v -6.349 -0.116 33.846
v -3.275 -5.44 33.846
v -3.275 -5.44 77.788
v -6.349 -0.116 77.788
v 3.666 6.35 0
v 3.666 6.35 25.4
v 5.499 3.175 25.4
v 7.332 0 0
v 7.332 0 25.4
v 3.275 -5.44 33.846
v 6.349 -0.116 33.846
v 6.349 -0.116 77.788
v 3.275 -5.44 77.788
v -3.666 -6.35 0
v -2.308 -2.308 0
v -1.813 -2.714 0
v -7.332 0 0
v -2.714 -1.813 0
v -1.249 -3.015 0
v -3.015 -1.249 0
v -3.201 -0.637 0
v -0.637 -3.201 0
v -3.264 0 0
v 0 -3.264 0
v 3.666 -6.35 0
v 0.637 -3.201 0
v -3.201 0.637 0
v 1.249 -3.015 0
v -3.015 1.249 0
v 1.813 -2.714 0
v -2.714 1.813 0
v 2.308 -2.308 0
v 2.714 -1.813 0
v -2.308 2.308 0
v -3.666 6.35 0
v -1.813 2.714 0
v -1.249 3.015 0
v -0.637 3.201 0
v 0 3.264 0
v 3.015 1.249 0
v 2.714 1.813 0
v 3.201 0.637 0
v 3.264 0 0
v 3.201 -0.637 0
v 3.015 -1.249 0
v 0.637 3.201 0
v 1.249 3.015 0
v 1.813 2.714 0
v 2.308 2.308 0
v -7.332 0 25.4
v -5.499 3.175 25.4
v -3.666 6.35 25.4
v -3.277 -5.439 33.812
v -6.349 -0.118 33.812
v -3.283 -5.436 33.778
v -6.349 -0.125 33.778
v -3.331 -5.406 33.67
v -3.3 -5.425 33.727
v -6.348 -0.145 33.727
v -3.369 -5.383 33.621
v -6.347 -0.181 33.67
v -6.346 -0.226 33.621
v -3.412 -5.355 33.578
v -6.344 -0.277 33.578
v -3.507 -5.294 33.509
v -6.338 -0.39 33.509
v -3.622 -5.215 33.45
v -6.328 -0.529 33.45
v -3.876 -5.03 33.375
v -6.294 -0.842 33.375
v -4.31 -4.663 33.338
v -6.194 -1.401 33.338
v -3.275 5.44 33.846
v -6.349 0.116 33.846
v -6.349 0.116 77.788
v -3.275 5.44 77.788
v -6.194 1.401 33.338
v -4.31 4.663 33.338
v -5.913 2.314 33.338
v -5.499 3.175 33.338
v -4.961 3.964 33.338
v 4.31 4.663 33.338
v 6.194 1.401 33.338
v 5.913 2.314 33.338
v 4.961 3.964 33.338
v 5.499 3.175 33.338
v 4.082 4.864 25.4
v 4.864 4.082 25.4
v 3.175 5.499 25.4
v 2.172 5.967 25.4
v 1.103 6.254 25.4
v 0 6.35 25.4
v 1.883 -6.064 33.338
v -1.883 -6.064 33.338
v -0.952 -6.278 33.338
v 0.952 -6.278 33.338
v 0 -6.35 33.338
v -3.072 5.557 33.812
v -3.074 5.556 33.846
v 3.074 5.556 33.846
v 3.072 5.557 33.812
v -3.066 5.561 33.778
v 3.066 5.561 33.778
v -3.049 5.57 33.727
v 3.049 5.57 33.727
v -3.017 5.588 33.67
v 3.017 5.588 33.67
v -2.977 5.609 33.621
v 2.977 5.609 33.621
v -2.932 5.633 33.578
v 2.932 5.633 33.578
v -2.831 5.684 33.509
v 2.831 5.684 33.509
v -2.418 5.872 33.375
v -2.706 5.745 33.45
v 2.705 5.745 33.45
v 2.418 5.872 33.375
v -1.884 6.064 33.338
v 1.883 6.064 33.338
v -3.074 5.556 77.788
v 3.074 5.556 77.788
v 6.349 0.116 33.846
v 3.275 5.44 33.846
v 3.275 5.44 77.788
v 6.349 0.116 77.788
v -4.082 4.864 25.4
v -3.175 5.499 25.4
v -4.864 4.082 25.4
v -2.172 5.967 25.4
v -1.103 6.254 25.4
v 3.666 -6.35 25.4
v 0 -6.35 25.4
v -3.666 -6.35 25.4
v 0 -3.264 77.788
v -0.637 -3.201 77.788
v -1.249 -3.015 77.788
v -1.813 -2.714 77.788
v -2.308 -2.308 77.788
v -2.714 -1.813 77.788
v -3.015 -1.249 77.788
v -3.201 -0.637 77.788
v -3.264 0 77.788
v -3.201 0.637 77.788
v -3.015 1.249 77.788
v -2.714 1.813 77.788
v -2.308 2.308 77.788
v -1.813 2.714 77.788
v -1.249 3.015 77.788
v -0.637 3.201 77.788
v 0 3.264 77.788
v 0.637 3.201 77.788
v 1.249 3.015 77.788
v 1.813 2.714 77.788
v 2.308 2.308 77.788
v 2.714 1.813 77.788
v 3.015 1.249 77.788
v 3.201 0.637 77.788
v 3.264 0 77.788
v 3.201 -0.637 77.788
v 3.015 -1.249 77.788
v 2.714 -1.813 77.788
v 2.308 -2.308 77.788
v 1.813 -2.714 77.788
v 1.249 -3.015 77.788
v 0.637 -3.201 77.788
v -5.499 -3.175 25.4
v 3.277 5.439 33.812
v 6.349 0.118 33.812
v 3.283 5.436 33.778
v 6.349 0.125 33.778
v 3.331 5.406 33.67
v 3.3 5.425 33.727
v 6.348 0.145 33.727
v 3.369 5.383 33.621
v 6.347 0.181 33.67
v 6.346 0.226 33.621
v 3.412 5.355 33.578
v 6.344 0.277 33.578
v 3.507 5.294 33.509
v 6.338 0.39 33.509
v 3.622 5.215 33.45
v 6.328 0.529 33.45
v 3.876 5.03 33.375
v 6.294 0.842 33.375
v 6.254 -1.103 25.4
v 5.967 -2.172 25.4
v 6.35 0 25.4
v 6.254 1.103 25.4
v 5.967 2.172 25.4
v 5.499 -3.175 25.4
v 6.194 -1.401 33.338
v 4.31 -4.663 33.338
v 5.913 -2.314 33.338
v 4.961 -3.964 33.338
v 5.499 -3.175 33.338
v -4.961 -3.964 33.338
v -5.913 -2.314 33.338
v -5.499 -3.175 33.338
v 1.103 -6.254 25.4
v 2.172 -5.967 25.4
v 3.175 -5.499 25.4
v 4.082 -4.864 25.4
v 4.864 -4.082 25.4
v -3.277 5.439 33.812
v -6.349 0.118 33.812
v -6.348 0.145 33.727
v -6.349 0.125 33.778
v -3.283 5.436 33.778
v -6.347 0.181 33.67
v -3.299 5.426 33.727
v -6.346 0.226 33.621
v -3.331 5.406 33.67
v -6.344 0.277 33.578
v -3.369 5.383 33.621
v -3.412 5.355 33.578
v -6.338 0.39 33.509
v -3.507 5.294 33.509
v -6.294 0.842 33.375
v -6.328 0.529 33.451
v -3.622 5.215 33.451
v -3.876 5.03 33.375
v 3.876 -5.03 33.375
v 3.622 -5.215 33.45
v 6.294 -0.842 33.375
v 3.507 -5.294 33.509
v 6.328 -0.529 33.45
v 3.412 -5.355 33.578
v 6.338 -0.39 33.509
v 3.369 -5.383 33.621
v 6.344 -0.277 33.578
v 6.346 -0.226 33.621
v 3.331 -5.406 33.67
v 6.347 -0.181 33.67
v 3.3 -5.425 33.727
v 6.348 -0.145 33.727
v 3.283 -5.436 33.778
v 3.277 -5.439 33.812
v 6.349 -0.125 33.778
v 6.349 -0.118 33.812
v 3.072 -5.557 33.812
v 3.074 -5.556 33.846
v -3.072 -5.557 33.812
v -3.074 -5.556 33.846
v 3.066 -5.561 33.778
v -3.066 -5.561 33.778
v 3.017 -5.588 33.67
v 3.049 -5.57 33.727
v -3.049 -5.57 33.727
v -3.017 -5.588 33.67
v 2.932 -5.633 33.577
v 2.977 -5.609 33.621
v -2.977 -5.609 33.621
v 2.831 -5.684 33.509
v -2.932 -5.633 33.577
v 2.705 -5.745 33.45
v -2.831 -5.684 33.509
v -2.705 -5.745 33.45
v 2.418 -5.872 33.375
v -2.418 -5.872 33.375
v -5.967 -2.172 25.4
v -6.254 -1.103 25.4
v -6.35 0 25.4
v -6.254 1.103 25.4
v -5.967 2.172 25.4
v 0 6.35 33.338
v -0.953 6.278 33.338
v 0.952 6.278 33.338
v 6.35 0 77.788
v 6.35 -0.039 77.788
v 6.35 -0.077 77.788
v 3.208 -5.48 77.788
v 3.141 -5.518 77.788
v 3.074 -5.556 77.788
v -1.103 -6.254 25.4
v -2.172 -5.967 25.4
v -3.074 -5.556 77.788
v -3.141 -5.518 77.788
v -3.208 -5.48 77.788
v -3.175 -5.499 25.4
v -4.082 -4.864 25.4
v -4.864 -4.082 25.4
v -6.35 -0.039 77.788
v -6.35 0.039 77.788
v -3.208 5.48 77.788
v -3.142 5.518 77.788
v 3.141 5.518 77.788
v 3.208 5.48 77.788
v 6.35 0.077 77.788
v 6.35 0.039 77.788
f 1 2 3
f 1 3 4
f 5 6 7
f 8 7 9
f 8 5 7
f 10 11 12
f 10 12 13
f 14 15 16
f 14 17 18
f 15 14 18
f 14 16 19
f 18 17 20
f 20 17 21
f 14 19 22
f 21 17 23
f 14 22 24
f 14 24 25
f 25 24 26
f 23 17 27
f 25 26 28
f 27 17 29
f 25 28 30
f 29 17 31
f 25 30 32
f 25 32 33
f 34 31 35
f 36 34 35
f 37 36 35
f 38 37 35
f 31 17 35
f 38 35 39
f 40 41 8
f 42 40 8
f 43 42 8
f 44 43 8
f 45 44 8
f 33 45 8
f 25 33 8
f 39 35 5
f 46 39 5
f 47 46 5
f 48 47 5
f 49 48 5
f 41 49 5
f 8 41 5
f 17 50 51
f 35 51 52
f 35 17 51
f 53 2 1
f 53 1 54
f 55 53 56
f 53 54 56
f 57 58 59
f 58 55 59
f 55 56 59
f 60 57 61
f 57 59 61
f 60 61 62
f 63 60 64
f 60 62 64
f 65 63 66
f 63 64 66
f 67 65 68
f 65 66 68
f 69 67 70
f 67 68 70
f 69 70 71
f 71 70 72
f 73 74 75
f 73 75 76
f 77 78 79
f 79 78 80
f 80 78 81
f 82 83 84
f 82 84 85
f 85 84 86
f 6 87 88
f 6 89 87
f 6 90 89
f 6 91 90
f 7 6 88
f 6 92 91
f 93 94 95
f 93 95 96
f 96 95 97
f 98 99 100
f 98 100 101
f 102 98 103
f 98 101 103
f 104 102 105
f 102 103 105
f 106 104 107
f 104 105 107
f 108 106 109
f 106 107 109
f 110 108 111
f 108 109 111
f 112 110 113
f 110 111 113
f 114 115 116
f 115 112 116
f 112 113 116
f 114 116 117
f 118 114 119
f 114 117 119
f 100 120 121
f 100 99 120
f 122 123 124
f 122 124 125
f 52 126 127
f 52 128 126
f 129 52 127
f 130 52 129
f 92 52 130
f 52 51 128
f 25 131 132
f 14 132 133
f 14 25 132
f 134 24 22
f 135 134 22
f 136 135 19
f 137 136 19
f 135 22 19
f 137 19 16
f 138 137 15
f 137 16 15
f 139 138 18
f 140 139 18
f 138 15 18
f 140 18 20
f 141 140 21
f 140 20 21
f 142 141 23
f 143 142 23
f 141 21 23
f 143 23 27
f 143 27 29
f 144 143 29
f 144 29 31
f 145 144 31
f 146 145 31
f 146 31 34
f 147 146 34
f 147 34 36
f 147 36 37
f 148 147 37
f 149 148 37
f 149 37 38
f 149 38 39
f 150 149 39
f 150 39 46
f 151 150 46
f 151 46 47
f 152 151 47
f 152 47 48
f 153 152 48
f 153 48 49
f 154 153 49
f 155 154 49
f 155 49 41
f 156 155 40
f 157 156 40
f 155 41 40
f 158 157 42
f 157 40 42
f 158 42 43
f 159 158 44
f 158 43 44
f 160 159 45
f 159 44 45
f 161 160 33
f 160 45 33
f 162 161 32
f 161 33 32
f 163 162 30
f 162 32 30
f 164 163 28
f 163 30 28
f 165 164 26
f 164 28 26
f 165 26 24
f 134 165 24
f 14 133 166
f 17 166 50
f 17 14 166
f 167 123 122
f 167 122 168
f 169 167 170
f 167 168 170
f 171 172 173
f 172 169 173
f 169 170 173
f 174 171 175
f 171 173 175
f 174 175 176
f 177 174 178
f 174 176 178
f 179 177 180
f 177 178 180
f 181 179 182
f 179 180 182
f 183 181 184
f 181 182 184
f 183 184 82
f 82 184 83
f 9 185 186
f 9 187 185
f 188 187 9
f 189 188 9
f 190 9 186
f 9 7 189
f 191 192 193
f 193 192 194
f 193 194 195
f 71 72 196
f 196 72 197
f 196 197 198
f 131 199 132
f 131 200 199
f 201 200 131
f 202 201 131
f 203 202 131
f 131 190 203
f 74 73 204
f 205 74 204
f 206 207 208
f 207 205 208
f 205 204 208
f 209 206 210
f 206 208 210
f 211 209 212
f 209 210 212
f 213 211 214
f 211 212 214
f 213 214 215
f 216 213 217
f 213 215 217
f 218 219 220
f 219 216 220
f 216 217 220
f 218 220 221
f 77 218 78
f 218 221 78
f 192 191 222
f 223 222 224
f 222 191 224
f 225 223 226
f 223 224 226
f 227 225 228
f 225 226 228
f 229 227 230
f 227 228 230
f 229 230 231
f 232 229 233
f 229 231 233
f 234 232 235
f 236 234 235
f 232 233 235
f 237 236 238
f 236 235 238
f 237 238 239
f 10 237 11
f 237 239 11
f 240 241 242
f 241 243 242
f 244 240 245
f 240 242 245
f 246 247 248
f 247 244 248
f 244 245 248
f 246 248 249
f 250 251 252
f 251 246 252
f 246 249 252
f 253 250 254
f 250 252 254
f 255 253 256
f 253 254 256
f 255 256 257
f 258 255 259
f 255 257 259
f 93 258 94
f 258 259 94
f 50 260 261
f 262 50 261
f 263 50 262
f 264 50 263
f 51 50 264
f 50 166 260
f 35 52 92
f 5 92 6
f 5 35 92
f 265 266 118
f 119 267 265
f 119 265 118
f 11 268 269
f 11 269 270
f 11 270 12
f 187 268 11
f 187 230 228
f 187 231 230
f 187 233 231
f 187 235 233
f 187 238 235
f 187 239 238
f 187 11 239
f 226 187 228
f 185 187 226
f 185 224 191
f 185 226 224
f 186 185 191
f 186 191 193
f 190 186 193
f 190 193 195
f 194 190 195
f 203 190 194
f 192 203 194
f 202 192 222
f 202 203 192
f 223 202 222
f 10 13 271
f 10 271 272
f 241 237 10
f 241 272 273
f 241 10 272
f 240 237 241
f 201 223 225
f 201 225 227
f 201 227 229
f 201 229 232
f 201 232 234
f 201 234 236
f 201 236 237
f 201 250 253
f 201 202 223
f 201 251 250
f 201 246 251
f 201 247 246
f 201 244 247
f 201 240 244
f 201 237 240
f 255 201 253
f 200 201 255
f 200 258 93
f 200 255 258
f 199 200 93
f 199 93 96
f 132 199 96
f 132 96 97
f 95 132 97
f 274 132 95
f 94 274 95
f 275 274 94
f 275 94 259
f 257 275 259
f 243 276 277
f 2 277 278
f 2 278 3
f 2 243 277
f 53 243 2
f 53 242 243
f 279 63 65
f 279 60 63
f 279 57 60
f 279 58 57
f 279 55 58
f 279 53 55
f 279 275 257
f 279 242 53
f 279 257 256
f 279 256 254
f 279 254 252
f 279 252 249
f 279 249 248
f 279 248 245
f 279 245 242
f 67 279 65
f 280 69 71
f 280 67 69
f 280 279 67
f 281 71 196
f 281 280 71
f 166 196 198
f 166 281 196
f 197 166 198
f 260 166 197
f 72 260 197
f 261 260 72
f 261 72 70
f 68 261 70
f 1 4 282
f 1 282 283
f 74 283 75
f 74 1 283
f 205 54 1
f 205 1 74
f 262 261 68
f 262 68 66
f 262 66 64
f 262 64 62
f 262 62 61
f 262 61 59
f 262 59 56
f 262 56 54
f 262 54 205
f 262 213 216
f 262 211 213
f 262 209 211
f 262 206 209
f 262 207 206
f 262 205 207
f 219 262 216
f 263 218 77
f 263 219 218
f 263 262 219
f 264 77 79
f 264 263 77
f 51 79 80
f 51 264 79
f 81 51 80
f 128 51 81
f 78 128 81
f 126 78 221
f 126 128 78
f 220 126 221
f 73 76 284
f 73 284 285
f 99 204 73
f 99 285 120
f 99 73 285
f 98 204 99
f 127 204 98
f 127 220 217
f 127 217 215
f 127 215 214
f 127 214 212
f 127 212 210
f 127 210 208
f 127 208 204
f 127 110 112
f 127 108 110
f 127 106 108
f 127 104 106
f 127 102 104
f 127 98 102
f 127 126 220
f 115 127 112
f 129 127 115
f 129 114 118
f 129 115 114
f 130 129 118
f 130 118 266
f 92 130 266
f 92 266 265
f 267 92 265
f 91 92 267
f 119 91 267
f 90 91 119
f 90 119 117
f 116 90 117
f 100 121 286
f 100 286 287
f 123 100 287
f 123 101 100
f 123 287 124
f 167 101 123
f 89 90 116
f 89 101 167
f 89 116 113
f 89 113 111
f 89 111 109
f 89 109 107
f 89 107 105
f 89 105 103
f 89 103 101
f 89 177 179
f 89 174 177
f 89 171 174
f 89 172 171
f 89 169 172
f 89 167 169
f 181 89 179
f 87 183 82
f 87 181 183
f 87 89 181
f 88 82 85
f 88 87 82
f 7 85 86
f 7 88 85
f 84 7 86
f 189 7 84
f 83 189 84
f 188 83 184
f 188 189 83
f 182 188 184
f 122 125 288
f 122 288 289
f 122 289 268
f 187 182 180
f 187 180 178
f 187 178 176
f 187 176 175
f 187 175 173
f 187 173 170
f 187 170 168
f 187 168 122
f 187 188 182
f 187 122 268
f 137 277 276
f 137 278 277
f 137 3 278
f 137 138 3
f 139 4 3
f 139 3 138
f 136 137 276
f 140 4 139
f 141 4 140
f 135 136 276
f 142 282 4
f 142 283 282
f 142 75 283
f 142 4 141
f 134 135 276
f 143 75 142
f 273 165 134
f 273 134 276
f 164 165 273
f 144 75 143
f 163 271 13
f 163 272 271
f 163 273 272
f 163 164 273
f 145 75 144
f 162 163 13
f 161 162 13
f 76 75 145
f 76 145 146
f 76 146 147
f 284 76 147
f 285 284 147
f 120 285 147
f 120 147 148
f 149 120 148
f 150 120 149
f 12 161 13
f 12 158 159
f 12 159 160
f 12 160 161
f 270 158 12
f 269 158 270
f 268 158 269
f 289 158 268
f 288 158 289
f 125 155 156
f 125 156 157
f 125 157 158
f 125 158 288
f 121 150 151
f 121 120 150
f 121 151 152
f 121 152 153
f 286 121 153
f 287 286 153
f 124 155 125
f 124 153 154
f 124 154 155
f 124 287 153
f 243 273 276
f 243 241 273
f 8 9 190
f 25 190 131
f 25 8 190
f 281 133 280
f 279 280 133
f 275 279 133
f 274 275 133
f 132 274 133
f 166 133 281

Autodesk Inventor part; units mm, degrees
ref_plane "YZ Plane" through (0, 0, 0) normal (1, 0, 0) x (0, 1, 0)
ref_plane "XZ Plane" through (0, 0, 0) normal (0, 1, 0) x (-1, 0, 0)
sketch "Sketch1" plane through (0, 0, 0) normal (0, 0, 1) x (1, 0, 0)
  line L0 (-7.3323, 0) -> (-3.6662, 6.35)
  line L1 (-3.6662, 6.35) -> (3.6662, 6.35)
  line L2 (3.6662, 6.35) -> (7.3323, 0)
  line L3 (7.3323, 0) -> (3.6662, -6.35)
  line L4 (3.6662, -6.35) -> (-3.6662, -6.35)
  line L5 (-3.6662, -6.35) -> (-7.3323, 0)
  point P0 (0, 0)
  point P1 (0, 0)
  dimension "d0" = 12.7
extrude "Extrusion1" add sketch "Sketch1" along normal blind 25.4
sketch "Sketch2" plane through (0, 0, 25.4) normal (0, 0, 1) x (1, 0, 0)
  circle A0 centre (0, 0) radius 6.35
  circle A1 centre (0, 0) radius 7.9375
  dimension "d3" = 12.7
  dimension "d18" = 15.875
extrude "Extrusion2" add sketch "Sketch2" along normal blind 7.9375 contours A0
ref_plane "Work Plane1" through (0, 0, 33.3375) normal (0, 0, 1) x (1, 0, 0)
sketch "Sketch3" plane through (0, 0, 33.3375) normal (0, 0, 1) x (1, 0, 0)
  circle A0 centre (0, 0) radius 6.35 projected
  line L0 (-6.4158, 0) -> (-3.2079, 5.5562)
  line L1 (-3.2079, 5.5562) -> (3.2079, 5.5563)
  line L2 (3.2079, 5.5563) -> (6.4158, 0)
  line L3 (6.4158, 0) -> (3.2079, -5.5563)
  line L4 (3.2079, -5.5563) -> (-3.2079, -5.5563)
  line L5 (-3.2079, -5.5563) -> (-6.4158, 0)
  dimension "d7" = 11.1125
extrude "Extrusion3" add sketch "Sketch3" along normal blind 44.45 contours A0 L3 L4 L5 L0 L1 L2 | A0 L2 L3 | A0 L1 L2 | L3 L4 A0 | A0 L0 L1 | L4 L5 A0 | A0 L5 L0
extrude "Extrusion6" cut sketch "Sketch2" along normal through all
fillet "Fillet1" radius 0.508 6 edges at (0, 5.5562, 33.3375) (4.8119, 2.7781, 33.3375) (4.8119, -2.7781, 33.3375) (0, -5.5563, 33.3375) (-4.8119, -2.7781, 33.3375) (-4.8119, 2.7781, 33.3375)
sketch "Sketch6" plane through (0, 0, 77.7875) normal (0, 0, 1) x (1, 0, 0)
  arc A0 (-3.0742, 5.5562) -> (-3.2748, 5.4404) centre (0, 0) ccw projected
hole "Hole2" at (0, 0, 77.7875) direction (0, 0, -1) diameter 6.5278 end through all clearance for "Socket Head Cap Screw" size "1/4" standard "Ansi Unified Screw Threads"
properties part number "Base OutputShaft"
